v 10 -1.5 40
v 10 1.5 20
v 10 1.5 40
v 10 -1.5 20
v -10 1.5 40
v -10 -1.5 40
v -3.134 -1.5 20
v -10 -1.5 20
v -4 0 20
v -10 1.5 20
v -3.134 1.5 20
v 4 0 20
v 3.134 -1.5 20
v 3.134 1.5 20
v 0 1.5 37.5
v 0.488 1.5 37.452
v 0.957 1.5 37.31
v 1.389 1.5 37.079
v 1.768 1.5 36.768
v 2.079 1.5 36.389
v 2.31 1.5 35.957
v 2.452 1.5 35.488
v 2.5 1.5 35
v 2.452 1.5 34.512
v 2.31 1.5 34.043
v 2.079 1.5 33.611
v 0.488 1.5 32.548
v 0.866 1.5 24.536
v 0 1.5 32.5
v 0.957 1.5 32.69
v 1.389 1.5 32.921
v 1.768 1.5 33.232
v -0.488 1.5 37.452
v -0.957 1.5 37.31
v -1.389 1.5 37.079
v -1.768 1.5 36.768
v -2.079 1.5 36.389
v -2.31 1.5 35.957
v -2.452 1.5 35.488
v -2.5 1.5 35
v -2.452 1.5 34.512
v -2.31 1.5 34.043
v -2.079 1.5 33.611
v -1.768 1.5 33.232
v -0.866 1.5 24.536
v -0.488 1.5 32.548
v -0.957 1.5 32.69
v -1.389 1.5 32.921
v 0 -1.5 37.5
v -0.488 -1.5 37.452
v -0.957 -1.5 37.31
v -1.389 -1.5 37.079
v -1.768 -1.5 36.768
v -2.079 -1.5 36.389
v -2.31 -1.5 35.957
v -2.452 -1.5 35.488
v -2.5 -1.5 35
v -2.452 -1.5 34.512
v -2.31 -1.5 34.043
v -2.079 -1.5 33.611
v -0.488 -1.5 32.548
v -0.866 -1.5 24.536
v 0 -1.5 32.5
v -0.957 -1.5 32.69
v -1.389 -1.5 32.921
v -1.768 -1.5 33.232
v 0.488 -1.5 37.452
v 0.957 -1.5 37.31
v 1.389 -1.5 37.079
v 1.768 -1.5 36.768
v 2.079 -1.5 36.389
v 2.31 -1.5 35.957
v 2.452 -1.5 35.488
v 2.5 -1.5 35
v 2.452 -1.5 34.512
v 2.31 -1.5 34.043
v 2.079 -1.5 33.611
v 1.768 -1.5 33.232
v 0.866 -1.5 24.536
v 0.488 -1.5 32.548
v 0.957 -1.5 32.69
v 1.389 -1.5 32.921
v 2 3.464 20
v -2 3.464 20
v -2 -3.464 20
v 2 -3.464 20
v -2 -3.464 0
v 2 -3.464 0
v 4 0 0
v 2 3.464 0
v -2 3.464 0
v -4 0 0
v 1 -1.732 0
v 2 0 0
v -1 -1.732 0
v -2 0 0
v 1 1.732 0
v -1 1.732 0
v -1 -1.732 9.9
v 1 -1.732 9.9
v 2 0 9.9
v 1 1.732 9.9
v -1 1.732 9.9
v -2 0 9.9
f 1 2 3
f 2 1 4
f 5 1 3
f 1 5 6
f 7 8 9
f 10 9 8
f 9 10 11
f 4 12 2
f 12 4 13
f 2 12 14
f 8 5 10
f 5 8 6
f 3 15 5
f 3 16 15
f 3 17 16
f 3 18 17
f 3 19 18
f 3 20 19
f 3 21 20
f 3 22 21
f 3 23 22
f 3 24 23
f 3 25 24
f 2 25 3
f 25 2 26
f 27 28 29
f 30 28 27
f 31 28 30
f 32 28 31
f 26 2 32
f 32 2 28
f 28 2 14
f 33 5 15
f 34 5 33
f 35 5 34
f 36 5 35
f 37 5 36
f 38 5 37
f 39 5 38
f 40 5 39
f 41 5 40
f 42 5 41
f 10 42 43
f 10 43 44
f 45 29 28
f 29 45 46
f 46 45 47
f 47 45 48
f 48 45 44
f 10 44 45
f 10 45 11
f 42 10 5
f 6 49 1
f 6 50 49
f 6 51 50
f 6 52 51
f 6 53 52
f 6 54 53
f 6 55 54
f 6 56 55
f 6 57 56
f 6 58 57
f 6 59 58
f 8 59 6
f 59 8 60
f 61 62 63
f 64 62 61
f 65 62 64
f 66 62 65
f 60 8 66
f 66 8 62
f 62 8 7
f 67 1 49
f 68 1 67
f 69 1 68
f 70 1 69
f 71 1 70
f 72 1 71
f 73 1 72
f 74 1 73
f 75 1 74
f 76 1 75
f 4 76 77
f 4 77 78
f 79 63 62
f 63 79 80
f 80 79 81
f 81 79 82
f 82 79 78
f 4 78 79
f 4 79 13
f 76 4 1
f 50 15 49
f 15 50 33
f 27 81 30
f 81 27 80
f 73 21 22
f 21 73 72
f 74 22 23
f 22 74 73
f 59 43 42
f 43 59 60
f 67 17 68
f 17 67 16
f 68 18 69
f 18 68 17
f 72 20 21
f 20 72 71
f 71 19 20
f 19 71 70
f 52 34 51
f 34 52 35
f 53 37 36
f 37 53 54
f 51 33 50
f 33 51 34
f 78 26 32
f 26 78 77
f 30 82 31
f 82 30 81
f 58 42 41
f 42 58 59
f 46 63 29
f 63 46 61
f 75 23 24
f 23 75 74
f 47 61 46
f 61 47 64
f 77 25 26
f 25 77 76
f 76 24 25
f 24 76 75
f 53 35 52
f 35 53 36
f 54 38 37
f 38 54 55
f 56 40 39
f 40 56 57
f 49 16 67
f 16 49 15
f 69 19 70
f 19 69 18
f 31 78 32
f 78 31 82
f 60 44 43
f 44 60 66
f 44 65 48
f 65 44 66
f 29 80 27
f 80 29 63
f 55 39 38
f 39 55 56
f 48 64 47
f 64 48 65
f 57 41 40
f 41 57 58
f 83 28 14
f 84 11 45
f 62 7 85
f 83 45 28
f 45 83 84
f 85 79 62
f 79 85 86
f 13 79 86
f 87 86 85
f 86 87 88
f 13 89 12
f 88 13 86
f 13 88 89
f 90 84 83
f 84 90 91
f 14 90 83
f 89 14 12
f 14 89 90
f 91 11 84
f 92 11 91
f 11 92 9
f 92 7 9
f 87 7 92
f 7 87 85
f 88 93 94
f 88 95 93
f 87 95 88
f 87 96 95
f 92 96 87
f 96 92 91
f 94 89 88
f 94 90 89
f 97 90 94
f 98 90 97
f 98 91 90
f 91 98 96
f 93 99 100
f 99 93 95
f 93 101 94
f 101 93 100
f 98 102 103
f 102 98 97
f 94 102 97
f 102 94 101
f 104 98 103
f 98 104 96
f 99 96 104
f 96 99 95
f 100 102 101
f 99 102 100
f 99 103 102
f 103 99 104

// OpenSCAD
/* [General] */
eps=0.1;
$fn=32;

/* [Head] */
head_type = "square"; //["square","printable","rounded"]

head_x = 20;
head_y = 3;
head_z = 20;

head_hole_d = 5;

/* [Blade] */

//height of the blade
blade_oh = 20;

//Outer diameter of the blade
blade_od = 8; //[2:0.1:20]

blade_sides = 6; //[3:64]

blade_ih = 10;

//Inner diameter of the blade
blade_id = 4; //[0:0.1:20]

/* [Blade - Pins] */
has_pins = false;
blade_pin_d = 2; //[0:0.1:5]
blade_pin_offset = 0; //[-5:0.1:5]
blade_pin_code = [0, 8, 3, 3, 1, 8, 1, 6];
blade_pin_h_mult = 0.333;
blade_pin_count = len(blade_pin_code);

/* [Blade - Nose] */
has_nose = false;
nose_x = 1.2;
nose_y = 1.2;
nose_z = 3;

module key(){
    translate([0,0,blade_oh]) {
        if (head_type=="square") head();
        if (head_type=="printable") head_printable();
        if (head_type=="rounded") head_rounded();
    }
    blade();
}

module head(){
    difference(){
        //body
        translate([0,0,head_z/2])
        cube([head_x,head_y,head_z], center=true);
        
        //hole
        translate([0,0,head_z-head_hole_d]) 
        rotate([90,0,0]) 
        cylinder(d=head_hole_d,h=head_y+eps,center=true);
    }
    
    //join to blade
    cylinder(d1=blade_od, d2=head_y, h=head_z/4, $fn=blade_sides);
}

module head_rounded(){
    difference(){
        //body
        translate([0,0,head_z/2])
        hull()
        for(ix=[-1,1], iz=[-1,1]) 
            translate([ix*(head_x/2-head_y/2),0,iz*(head_z/2-head_y/2)]) 
            sphere(d=head_y, $fn=16);
        
        //hole
        translate([0,0,head_z-head_hole_d]) 
        rotate([90,0,0]) 
        cylinder(d=head_hole_d,h=head_y+eps,center=true);
    }
    
    //join to blade
    cylinder(d1=blade_od, d2=head_y, h=head_z/4, $fn=blade_sides);
}

module head_printable(){
    difference(){
        hull(){
            cylinder(d=blade_od, h=eps, $fn=blade_sides);
            translate([0,0,head_z-5]) cube([head_x,head_y,3],center=true);
            translate([0,0,head_z]) cube (head_y,center=true);
        }
     //hole
    translate([0,0,head_z-head_hole_d]) 
    rotate([90,0,0]) 
    cylinder(d=head_hole_d,h=head_y*2,center=true);
}
}
module blade(){
    assert(blade_od > blade_id, "Outer diameter of the blade must be bigger than inner diameter");
    
    difference(){
        //body
        cylinder(h=blade_oh, d=blade_od, $fn=blade_sides);
        
        //inner hole
        translate([0,0,-eps]) 
        cylinder(h=blade_ih, d=blade_id, $fn=blade_sides);
        
        //pins
        if (has_pins)
            for(i= [0:blade_pin_count-1]) 
            let(rz_step = 360/blade_pin_count, 
                az = i*rz_step, 
                hz = blade_pin_code[i]*blade_pin_h_mult) {
                    
                echo(i);
                echo(hz);
                rotate([0,0,az])
                translate([blade_od/2+blade_pin_offset,0,-eps]) 
                cylinder(d=blade_pin_d, h=hz);
            }
    }

    if (has_nose)
        translate([blade_od/2+nose_x/2-eps,0,nose_z/2]) 
        cube([nose_x,nose_y,nose_z], center=true);
}

key();
